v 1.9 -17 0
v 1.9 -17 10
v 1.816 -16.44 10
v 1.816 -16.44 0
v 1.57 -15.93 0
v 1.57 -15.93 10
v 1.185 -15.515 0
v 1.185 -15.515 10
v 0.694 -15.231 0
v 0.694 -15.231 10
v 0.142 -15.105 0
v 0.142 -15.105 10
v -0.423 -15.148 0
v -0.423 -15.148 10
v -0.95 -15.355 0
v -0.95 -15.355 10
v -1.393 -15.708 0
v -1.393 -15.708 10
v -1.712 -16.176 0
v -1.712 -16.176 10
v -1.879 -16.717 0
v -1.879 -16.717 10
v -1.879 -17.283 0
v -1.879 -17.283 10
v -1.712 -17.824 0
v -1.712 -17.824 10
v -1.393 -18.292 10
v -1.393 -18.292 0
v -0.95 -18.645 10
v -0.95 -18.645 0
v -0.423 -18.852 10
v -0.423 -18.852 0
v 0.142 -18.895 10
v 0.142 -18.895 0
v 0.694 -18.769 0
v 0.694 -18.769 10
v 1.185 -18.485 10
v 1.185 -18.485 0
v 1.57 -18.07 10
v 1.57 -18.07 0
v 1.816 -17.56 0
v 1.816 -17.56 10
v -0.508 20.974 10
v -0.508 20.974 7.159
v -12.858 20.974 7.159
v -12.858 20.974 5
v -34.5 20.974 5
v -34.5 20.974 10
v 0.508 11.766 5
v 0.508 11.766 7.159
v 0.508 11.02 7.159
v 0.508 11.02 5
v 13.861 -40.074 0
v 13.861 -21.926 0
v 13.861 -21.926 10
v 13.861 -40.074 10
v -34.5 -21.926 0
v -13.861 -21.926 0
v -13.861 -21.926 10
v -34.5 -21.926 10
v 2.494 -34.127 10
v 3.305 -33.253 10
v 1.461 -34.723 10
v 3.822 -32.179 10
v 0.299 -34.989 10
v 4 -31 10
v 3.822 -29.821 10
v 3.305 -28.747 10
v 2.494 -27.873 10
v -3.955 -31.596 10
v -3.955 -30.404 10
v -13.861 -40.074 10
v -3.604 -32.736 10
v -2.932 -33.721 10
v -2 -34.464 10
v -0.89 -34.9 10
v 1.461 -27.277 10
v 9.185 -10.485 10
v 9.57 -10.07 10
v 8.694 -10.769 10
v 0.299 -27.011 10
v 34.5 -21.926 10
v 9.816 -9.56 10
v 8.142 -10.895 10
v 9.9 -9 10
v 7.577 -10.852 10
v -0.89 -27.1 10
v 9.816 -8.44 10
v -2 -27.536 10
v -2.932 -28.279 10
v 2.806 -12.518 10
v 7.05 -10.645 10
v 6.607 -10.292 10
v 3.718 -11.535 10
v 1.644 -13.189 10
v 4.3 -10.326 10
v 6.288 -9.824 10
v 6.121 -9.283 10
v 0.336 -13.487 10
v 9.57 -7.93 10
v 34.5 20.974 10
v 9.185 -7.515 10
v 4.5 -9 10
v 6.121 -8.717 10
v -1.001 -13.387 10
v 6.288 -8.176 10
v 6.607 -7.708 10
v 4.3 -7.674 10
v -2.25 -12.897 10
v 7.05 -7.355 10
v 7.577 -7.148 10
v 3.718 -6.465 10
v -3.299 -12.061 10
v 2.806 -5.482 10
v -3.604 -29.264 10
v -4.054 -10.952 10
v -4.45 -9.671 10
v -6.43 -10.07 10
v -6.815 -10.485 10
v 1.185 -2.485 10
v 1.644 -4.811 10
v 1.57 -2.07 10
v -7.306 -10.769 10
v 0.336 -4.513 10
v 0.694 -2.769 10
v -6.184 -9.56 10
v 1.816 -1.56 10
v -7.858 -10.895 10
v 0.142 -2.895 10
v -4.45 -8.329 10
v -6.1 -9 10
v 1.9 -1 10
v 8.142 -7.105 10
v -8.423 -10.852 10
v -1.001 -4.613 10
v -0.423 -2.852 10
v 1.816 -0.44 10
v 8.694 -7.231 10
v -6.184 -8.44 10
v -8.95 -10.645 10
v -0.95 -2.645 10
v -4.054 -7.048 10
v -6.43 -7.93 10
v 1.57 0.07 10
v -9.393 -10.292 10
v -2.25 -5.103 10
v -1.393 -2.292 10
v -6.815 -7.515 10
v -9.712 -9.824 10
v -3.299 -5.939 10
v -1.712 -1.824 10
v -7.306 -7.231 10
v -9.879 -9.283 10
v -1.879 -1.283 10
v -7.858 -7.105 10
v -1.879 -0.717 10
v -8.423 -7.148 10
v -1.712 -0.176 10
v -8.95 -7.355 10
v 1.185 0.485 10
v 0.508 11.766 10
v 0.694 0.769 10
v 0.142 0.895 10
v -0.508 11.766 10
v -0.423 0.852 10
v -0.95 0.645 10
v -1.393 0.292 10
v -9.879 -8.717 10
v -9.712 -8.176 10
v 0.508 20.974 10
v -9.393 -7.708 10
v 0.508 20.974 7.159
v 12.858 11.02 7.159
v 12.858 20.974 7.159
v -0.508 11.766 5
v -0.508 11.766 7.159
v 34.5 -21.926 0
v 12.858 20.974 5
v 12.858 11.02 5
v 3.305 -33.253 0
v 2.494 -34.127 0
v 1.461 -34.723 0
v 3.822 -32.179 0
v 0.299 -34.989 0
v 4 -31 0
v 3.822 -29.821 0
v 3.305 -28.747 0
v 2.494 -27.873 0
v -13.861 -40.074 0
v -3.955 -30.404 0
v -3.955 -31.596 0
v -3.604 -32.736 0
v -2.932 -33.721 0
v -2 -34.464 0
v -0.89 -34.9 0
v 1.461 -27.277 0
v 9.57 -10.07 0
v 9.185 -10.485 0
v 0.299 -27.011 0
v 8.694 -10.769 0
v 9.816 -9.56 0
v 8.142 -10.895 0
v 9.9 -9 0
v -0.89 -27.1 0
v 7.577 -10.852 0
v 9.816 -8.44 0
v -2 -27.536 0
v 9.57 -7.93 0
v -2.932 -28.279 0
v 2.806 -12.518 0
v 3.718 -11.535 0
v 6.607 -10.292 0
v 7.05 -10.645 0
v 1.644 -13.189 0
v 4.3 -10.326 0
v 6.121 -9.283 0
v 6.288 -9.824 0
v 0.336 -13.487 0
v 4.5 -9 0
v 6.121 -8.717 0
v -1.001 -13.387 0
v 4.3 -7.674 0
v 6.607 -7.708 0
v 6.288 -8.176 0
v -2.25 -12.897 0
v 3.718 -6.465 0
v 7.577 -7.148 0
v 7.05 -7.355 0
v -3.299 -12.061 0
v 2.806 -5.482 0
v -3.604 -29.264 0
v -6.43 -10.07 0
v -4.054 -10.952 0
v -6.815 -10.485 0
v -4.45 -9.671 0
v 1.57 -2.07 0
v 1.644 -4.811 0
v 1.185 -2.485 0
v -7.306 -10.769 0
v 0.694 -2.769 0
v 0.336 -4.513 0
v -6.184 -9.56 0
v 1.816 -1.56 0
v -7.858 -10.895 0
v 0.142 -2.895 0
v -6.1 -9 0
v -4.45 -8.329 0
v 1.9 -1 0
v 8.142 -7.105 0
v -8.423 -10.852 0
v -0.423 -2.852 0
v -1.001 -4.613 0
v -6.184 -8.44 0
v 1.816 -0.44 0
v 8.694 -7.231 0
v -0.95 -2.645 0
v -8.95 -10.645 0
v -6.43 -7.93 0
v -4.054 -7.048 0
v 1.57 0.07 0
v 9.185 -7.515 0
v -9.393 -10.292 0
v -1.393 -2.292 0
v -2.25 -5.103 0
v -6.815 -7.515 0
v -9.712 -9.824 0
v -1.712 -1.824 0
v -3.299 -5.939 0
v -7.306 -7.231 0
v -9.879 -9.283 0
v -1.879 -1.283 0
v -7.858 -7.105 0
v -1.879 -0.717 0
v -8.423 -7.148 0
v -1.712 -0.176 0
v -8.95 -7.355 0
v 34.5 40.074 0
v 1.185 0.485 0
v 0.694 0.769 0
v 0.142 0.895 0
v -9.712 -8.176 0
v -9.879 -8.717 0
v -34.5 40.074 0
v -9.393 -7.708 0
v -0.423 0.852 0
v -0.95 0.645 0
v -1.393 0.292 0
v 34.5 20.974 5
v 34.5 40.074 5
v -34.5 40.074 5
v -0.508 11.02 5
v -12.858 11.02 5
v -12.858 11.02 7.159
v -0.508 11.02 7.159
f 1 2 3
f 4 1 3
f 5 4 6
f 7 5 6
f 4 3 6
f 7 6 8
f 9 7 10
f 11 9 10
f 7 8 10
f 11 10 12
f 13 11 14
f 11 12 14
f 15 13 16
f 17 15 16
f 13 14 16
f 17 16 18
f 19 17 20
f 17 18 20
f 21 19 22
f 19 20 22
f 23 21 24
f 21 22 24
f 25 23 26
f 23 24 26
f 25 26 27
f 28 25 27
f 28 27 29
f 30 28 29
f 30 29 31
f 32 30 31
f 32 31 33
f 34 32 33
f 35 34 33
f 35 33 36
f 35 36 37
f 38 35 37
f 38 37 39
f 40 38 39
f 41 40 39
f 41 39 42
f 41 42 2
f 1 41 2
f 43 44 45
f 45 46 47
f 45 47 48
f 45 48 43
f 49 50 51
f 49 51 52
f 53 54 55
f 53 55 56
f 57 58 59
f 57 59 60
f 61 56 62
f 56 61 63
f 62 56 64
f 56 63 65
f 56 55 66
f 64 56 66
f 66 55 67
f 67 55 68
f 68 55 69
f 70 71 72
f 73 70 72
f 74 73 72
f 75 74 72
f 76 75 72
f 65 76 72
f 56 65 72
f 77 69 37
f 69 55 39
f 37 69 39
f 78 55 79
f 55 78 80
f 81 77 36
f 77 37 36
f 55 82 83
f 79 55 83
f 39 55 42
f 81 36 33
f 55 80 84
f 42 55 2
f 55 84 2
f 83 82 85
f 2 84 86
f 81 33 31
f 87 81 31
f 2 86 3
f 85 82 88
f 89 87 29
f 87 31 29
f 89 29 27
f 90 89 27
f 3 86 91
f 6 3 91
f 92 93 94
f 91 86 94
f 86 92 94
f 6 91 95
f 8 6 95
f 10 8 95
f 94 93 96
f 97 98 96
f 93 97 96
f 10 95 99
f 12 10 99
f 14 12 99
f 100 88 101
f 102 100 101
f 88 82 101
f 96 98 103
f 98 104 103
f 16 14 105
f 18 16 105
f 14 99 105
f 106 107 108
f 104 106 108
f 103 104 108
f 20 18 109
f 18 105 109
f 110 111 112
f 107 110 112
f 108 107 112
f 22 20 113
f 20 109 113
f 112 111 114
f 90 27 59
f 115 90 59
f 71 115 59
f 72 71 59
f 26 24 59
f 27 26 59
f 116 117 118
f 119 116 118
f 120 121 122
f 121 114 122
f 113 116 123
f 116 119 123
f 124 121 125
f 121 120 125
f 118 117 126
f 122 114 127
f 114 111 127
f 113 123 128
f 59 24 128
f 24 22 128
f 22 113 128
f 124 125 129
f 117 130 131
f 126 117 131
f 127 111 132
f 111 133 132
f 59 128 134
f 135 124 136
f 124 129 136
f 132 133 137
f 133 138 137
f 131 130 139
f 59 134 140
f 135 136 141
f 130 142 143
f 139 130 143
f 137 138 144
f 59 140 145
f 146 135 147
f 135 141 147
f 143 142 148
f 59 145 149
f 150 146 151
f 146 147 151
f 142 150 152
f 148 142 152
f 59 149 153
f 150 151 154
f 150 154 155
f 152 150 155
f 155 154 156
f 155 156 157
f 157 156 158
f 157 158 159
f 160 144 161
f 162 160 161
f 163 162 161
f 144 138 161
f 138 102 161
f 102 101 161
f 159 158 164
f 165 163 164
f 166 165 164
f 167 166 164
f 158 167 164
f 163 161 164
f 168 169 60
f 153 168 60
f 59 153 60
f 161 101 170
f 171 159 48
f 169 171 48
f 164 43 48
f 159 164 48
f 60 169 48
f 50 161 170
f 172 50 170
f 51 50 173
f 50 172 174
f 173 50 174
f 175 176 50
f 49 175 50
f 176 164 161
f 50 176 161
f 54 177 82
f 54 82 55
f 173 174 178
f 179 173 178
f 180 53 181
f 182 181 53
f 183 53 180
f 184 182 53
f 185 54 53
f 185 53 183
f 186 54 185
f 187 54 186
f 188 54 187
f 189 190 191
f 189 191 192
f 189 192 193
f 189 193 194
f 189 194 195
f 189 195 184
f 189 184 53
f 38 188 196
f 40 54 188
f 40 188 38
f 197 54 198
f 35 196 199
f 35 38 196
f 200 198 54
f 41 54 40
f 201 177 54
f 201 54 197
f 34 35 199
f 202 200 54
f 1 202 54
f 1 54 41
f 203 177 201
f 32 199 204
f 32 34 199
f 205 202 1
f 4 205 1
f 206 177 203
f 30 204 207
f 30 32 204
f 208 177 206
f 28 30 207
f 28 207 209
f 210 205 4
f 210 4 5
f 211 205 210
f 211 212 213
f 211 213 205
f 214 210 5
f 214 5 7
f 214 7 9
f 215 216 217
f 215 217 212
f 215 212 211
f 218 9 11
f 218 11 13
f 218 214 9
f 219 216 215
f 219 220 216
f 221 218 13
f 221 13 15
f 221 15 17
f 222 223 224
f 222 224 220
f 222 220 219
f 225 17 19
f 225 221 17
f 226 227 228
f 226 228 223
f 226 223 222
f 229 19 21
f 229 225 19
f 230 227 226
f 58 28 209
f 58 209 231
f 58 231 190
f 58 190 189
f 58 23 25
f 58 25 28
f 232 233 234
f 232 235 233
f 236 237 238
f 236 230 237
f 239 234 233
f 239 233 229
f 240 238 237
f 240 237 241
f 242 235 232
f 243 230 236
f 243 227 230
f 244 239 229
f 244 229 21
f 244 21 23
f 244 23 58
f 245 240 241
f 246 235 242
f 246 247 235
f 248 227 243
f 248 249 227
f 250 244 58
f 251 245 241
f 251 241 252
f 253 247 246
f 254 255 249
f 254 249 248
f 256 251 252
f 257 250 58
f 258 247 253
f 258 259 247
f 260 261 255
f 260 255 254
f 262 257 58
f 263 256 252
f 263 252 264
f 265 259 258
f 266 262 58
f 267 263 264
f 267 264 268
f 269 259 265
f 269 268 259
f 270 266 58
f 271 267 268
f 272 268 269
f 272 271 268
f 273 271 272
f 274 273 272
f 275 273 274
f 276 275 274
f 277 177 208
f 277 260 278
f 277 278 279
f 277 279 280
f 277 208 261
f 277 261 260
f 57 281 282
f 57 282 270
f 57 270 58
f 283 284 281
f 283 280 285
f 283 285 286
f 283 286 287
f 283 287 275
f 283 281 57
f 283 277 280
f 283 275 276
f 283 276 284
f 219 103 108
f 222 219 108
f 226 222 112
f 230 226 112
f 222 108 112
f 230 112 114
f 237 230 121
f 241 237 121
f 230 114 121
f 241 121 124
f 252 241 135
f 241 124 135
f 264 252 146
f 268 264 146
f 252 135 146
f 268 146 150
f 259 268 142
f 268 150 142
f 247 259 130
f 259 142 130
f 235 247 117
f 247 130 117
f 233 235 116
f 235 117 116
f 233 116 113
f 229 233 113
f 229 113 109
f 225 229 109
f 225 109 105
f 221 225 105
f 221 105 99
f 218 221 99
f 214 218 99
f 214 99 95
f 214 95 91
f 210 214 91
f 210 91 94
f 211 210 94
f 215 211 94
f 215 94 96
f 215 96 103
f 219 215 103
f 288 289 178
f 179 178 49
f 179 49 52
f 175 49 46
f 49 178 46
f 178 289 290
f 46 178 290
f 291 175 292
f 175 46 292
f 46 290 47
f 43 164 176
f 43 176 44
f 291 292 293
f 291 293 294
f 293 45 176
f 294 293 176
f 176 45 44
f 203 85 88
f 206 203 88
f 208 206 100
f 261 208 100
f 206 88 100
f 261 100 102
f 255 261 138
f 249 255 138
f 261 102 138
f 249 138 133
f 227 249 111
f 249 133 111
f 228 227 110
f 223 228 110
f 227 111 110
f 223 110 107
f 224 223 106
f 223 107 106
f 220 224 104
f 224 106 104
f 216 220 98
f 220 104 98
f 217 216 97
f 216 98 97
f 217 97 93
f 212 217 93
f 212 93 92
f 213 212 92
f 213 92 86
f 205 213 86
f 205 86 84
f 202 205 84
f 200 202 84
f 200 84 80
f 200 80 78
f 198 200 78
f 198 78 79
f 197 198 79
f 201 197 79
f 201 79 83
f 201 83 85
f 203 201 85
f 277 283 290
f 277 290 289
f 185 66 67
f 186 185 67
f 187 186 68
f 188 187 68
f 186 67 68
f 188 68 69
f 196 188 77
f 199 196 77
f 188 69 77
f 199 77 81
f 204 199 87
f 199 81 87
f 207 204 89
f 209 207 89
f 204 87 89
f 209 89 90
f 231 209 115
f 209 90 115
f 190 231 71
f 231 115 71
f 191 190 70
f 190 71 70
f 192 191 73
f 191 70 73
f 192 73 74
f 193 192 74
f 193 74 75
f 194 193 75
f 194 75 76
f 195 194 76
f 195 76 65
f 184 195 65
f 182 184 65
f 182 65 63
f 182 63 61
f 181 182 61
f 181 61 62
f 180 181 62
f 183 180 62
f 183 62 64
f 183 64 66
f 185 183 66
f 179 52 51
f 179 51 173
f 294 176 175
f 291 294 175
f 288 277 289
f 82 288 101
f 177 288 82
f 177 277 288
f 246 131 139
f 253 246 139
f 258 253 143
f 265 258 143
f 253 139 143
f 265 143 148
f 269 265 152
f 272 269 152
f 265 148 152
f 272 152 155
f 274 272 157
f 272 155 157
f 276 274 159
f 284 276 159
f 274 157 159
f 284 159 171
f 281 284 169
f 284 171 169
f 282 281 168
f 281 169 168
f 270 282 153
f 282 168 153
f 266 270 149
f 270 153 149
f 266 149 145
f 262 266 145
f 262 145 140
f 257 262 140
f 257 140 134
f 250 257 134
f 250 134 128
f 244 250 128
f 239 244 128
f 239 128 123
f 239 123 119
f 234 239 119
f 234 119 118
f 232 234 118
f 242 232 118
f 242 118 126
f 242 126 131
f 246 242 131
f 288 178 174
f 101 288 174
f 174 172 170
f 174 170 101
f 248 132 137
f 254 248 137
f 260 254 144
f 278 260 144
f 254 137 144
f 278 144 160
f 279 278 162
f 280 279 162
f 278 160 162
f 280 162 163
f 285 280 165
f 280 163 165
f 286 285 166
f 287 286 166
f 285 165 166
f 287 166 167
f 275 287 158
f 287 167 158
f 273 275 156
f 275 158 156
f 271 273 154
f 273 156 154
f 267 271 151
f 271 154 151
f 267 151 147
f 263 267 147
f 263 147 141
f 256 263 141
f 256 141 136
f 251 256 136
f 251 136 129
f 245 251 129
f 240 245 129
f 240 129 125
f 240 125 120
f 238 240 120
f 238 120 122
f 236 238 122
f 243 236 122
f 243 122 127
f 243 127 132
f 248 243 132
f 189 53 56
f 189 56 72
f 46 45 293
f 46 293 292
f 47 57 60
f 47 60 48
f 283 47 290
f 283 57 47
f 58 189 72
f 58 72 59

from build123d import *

# Parameters (mm, degrees)
BOSS_EXTRUDE1_DEPTH     = 10
SKETCH2_R               = 4
SKETCH2_R_2             = 4.5
SKETCH2_R_3             = 1.9
CUT_EXTRUDE1_DEPTH      = 11
CUT_EXTRUDE2_DEPTH      = 1
CUT_EXTRUDE2_DEPTH_BACK = 70
SKETCH5_W               = 1.016
SKETCH5_H               = 9.2075
CUT_EXTRUDE4_DEPTH      = 5
SKETCH6_W               = 12.35
SKETCH6_H               = 2.159
CUT_EXTRUDE5_DEPTH      = 9.954
SKETCH7_W               = 12.35
SKETCH7_H               = 2.159
CUT_EXTRUDE6_DEPTH      = 9.954


with BuildPart() as part:
    # Sketch1 → Boss-Extrude1 (new body)
    with BuildSketch(Plane.XY):
        Polygon((-34.5, 40.07390675), (34.5, 40.07390675), (34.5, -21.92609325), (13.861088822, -21.92609325), (13.861088822, -40.07390675), (-13.861088822, -40.07390675), (-13.861088822, -21.92609325), (-34.5, -21.92609325), align=None)
    extrude(amount=BOSS_EXTRUDE1_DEPTH)

    # Sketch2 → Cut-Extrude1 (cut, through all)
    with BuildSketch(Plane.XY.offset(10)):
        with Locations((0, -31)):
            Circle(SKETCH2_R)
        with Locations((0, -9)):
            Circle(SKETCH2_R_2)
        with Locations((0, -1)):
            Circle(SKETCH2_R_3)
        with Locations((8, -9)):
            Circle(SKETCH2_R_3)
        with Locations((0, -17)):
            Circle(SKETCH2_R_3)
        with Locations((-8, -9)):
            Circle(SKETCH2_R_3)
    extrude(amount=-CUT_EXTRUDE1_DEPTH, mode=Mode.SUBTRACT)

    # Sketch4 → Cut-Extrude2 (cut, two sides)
    with BuildSketch(Plane.ZY.offset(34.5)) as cut_extrude2_sk:
        Polygon((5, 210.681154515), (5, 40.07390675), (5, 20.97390675), (10, 20.97390675), (180.607247765, 20.97390675), (431.008352756, 252.763937984), (255.401104991, 442.471185749), align=None)
    extrude(amount=CUT_EXTRUDE2_DEPTH, mode=Mode.SUBTRACT)
    extrude(cut_extrude2_sk.sketch, amount=-CUT_EXTRUDE2_DEPTH_BACK, mode=Mode.SUBTRACT)

    # Sketch5 → Cut-Extrude4 (cut)
    with BuildSketch(Plane.XY.offset(10)):
        with Locations((0, 16.37015675)):
            Rectangle(SKETCH5_W, SKETCH5_H)
    extrude(amount=-CUT_EXTRUDE4_DEPTH, mode=Mode.SUBTRACT)

    # Sketch6 → Cut-Extrude5 (cut)
    with BuildSketch(Plane(origin=(0, 20.97390675, 0), x_dir=(1, 0, 0), z_dir=(0, 1, 0))):
        with Locations((-6.683, -6.0795)):
            Rectangle(SKETCH6_W, SKETCH6_H)
    extrude(amount=-CUT_EXTRUDE5_DEPTH, mode=Mode.SUBTRACT)

    # Sketch7 → Cut-Extrude6 (cut)
    with BuildSketch(Plane(origin=(0, 20.97390675, 0), x_dir=(1, 0, 0), z_dir=(0, 1, 0))):
        with Locations((6.683, -6.0795)):
            Rectangle(SKETCH7_W, SKETCH7_H)
    extrude(amount=-CUT_EXTRUDE6_DEPTH, mode=Mode.SUBTRACT)


solid = part.part
